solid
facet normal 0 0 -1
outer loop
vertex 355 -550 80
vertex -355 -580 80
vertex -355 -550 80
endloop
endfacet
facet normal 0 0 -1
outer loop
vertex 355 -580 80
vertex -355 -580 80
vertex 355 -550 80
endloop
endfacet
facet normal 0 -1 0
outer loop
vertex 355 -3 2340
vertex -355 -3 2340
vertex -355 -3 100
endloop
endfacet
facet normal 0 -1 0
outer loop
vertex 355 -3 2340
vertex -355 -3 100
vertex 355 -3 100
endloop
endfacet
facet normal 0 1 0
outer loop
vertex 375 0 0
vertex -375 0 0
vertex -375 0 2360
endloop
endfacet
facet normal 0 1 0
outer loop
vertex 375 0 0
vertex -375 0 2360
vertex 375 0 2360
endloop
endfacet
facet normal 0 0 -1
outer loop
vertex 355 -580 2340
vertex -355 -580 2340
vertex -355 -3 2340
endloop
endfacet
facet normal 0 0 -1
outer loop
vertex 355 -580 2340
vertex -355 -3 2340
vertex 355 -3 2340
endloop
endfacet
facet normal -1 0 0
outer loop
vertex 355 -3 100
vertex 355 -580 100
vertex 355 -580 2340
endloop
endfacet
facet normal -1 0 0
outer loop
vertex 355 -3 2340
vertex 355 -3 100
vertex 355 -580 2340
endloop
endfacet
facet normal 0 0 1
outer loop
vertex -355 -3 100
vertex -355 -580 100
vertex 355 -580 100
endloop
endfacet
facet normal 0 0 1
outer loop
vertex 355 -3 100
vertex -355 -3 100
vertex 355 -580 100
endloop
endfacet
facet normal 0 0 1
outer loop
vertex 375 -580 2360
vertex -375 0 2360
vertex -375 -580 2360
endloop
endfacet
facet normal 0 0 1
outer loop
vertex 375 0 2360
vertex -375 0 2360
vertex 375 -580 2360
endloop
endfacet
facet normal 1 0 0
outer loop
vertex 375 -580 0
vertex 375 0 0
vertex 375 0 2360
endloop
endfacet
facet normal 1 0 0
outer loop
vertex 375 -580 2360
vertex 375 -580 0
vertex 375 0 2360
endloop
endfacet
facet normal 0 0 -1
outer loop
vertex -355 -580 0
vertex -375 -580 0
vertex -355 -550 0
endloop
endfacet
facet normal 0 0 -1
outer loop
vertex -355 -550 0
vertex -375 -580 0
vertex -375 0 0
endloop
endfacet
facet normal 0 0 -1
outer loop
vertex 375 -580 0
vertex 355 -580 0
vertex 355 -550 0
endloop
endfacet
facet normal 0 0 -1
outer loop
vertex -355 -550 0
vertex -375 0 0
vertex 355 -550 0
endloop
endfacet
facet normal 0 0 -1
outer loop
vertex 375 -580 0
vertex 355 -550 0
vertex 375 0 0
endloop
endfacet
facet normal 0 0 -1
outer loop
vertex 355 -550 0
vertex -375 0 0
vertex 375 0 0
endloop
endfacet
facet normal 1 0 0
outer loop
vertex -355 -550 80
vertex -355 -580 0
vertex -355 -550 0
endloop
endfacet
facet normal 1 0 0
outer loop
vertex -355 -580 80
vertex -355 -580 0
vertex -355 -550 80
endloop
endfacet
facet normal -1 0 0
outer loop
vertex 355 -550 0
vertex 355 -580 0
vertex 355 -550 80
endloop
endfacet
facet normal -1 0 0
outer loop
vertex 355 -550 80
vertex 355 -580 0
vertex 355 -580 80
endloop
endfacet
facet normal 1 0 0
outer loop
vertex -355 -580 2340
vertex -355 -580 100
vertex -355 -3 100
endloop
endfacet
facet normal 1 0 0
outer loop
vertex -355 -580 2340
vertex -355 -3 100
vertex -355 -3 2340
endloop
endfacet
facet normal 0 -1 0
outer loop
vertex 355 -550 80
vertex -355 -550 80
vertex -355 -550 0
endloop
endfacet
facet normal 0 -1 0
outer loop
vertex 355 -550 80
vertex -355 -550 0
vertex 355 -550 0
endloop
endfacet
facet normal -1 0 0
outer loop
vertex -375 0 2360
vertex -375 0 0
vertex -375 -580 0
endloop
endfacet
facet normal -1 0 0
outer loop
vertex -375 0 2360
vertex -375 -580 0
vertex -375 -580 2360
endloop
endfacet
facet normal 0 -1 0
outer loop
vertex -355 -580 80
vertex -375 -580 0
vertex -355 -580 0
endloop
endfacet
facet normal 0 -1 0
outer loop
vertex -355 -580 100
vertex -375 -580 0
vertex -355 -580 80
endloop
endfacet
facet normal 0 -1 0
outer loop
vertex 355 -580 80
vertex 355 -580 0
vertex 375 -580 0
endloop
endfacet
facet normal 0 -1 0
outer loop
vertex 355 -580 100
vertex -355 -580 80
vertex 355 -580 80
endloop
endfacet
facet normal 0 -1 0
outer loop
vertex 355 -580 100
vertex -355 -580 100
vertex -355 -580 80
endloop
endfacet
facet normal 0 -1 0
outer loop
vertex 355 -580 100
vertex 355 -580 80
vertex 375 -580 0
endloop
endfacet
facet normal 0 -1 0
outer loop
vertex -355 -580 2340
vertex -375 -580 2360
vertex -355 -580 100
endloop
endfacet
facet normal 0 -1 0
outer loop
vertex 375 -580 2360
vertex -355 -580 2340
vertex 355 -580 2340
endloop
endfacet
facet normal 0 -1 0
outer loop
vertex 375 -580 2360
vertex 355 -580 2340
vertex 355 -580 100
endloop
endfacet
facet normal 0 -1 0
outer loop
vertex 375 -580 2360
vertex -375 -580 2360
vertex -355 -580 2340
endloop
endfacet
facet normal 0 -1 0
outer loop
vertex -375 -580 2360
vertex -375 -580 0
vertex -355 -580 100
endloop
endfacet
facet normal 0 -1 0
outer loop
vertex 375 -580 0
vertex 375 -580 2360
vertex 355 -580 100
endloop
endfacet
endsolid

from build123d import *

# Parameters (mm, degrees)
F0_W     = 750
F0_H     = 2360
F1_DEPTH = 580
F2_W     = 710
F2_H     = 2240
F4_DEPTH = 577
F5_W     = 710
F5_H     = 80
F6_DEPTH = 30


with BuildPart() as f1:
    # F0 (on Front) → F1 (new body)
    with BuildSketch(Plane.XZ):
        with Locations((0, 1180)):
            Rectangle(F0_W, F0_H)
    extrude(amount=F1_DEPTH)

    # F2 (on face) → F4 (cut, through all)
    with BuildSketch(Plane.XZ.offset(580)):
        with Locations((0, 1220)):
            Rectangle(F2_W, F2_H)
    extrude(amount=-F4_DEPTH, mode=Mode.SUBTRACT)

    # F5 (on face) → F6 (cut)
    with BuildSketch(Plane.XZ.offset(580)):
        with Locations((0, 40)):
            Rectangle(F5_W, F5_H)
    extrude(amount=-F6_DEPTH, mode=Mode.SUBTRACT)


solid = f1.part
